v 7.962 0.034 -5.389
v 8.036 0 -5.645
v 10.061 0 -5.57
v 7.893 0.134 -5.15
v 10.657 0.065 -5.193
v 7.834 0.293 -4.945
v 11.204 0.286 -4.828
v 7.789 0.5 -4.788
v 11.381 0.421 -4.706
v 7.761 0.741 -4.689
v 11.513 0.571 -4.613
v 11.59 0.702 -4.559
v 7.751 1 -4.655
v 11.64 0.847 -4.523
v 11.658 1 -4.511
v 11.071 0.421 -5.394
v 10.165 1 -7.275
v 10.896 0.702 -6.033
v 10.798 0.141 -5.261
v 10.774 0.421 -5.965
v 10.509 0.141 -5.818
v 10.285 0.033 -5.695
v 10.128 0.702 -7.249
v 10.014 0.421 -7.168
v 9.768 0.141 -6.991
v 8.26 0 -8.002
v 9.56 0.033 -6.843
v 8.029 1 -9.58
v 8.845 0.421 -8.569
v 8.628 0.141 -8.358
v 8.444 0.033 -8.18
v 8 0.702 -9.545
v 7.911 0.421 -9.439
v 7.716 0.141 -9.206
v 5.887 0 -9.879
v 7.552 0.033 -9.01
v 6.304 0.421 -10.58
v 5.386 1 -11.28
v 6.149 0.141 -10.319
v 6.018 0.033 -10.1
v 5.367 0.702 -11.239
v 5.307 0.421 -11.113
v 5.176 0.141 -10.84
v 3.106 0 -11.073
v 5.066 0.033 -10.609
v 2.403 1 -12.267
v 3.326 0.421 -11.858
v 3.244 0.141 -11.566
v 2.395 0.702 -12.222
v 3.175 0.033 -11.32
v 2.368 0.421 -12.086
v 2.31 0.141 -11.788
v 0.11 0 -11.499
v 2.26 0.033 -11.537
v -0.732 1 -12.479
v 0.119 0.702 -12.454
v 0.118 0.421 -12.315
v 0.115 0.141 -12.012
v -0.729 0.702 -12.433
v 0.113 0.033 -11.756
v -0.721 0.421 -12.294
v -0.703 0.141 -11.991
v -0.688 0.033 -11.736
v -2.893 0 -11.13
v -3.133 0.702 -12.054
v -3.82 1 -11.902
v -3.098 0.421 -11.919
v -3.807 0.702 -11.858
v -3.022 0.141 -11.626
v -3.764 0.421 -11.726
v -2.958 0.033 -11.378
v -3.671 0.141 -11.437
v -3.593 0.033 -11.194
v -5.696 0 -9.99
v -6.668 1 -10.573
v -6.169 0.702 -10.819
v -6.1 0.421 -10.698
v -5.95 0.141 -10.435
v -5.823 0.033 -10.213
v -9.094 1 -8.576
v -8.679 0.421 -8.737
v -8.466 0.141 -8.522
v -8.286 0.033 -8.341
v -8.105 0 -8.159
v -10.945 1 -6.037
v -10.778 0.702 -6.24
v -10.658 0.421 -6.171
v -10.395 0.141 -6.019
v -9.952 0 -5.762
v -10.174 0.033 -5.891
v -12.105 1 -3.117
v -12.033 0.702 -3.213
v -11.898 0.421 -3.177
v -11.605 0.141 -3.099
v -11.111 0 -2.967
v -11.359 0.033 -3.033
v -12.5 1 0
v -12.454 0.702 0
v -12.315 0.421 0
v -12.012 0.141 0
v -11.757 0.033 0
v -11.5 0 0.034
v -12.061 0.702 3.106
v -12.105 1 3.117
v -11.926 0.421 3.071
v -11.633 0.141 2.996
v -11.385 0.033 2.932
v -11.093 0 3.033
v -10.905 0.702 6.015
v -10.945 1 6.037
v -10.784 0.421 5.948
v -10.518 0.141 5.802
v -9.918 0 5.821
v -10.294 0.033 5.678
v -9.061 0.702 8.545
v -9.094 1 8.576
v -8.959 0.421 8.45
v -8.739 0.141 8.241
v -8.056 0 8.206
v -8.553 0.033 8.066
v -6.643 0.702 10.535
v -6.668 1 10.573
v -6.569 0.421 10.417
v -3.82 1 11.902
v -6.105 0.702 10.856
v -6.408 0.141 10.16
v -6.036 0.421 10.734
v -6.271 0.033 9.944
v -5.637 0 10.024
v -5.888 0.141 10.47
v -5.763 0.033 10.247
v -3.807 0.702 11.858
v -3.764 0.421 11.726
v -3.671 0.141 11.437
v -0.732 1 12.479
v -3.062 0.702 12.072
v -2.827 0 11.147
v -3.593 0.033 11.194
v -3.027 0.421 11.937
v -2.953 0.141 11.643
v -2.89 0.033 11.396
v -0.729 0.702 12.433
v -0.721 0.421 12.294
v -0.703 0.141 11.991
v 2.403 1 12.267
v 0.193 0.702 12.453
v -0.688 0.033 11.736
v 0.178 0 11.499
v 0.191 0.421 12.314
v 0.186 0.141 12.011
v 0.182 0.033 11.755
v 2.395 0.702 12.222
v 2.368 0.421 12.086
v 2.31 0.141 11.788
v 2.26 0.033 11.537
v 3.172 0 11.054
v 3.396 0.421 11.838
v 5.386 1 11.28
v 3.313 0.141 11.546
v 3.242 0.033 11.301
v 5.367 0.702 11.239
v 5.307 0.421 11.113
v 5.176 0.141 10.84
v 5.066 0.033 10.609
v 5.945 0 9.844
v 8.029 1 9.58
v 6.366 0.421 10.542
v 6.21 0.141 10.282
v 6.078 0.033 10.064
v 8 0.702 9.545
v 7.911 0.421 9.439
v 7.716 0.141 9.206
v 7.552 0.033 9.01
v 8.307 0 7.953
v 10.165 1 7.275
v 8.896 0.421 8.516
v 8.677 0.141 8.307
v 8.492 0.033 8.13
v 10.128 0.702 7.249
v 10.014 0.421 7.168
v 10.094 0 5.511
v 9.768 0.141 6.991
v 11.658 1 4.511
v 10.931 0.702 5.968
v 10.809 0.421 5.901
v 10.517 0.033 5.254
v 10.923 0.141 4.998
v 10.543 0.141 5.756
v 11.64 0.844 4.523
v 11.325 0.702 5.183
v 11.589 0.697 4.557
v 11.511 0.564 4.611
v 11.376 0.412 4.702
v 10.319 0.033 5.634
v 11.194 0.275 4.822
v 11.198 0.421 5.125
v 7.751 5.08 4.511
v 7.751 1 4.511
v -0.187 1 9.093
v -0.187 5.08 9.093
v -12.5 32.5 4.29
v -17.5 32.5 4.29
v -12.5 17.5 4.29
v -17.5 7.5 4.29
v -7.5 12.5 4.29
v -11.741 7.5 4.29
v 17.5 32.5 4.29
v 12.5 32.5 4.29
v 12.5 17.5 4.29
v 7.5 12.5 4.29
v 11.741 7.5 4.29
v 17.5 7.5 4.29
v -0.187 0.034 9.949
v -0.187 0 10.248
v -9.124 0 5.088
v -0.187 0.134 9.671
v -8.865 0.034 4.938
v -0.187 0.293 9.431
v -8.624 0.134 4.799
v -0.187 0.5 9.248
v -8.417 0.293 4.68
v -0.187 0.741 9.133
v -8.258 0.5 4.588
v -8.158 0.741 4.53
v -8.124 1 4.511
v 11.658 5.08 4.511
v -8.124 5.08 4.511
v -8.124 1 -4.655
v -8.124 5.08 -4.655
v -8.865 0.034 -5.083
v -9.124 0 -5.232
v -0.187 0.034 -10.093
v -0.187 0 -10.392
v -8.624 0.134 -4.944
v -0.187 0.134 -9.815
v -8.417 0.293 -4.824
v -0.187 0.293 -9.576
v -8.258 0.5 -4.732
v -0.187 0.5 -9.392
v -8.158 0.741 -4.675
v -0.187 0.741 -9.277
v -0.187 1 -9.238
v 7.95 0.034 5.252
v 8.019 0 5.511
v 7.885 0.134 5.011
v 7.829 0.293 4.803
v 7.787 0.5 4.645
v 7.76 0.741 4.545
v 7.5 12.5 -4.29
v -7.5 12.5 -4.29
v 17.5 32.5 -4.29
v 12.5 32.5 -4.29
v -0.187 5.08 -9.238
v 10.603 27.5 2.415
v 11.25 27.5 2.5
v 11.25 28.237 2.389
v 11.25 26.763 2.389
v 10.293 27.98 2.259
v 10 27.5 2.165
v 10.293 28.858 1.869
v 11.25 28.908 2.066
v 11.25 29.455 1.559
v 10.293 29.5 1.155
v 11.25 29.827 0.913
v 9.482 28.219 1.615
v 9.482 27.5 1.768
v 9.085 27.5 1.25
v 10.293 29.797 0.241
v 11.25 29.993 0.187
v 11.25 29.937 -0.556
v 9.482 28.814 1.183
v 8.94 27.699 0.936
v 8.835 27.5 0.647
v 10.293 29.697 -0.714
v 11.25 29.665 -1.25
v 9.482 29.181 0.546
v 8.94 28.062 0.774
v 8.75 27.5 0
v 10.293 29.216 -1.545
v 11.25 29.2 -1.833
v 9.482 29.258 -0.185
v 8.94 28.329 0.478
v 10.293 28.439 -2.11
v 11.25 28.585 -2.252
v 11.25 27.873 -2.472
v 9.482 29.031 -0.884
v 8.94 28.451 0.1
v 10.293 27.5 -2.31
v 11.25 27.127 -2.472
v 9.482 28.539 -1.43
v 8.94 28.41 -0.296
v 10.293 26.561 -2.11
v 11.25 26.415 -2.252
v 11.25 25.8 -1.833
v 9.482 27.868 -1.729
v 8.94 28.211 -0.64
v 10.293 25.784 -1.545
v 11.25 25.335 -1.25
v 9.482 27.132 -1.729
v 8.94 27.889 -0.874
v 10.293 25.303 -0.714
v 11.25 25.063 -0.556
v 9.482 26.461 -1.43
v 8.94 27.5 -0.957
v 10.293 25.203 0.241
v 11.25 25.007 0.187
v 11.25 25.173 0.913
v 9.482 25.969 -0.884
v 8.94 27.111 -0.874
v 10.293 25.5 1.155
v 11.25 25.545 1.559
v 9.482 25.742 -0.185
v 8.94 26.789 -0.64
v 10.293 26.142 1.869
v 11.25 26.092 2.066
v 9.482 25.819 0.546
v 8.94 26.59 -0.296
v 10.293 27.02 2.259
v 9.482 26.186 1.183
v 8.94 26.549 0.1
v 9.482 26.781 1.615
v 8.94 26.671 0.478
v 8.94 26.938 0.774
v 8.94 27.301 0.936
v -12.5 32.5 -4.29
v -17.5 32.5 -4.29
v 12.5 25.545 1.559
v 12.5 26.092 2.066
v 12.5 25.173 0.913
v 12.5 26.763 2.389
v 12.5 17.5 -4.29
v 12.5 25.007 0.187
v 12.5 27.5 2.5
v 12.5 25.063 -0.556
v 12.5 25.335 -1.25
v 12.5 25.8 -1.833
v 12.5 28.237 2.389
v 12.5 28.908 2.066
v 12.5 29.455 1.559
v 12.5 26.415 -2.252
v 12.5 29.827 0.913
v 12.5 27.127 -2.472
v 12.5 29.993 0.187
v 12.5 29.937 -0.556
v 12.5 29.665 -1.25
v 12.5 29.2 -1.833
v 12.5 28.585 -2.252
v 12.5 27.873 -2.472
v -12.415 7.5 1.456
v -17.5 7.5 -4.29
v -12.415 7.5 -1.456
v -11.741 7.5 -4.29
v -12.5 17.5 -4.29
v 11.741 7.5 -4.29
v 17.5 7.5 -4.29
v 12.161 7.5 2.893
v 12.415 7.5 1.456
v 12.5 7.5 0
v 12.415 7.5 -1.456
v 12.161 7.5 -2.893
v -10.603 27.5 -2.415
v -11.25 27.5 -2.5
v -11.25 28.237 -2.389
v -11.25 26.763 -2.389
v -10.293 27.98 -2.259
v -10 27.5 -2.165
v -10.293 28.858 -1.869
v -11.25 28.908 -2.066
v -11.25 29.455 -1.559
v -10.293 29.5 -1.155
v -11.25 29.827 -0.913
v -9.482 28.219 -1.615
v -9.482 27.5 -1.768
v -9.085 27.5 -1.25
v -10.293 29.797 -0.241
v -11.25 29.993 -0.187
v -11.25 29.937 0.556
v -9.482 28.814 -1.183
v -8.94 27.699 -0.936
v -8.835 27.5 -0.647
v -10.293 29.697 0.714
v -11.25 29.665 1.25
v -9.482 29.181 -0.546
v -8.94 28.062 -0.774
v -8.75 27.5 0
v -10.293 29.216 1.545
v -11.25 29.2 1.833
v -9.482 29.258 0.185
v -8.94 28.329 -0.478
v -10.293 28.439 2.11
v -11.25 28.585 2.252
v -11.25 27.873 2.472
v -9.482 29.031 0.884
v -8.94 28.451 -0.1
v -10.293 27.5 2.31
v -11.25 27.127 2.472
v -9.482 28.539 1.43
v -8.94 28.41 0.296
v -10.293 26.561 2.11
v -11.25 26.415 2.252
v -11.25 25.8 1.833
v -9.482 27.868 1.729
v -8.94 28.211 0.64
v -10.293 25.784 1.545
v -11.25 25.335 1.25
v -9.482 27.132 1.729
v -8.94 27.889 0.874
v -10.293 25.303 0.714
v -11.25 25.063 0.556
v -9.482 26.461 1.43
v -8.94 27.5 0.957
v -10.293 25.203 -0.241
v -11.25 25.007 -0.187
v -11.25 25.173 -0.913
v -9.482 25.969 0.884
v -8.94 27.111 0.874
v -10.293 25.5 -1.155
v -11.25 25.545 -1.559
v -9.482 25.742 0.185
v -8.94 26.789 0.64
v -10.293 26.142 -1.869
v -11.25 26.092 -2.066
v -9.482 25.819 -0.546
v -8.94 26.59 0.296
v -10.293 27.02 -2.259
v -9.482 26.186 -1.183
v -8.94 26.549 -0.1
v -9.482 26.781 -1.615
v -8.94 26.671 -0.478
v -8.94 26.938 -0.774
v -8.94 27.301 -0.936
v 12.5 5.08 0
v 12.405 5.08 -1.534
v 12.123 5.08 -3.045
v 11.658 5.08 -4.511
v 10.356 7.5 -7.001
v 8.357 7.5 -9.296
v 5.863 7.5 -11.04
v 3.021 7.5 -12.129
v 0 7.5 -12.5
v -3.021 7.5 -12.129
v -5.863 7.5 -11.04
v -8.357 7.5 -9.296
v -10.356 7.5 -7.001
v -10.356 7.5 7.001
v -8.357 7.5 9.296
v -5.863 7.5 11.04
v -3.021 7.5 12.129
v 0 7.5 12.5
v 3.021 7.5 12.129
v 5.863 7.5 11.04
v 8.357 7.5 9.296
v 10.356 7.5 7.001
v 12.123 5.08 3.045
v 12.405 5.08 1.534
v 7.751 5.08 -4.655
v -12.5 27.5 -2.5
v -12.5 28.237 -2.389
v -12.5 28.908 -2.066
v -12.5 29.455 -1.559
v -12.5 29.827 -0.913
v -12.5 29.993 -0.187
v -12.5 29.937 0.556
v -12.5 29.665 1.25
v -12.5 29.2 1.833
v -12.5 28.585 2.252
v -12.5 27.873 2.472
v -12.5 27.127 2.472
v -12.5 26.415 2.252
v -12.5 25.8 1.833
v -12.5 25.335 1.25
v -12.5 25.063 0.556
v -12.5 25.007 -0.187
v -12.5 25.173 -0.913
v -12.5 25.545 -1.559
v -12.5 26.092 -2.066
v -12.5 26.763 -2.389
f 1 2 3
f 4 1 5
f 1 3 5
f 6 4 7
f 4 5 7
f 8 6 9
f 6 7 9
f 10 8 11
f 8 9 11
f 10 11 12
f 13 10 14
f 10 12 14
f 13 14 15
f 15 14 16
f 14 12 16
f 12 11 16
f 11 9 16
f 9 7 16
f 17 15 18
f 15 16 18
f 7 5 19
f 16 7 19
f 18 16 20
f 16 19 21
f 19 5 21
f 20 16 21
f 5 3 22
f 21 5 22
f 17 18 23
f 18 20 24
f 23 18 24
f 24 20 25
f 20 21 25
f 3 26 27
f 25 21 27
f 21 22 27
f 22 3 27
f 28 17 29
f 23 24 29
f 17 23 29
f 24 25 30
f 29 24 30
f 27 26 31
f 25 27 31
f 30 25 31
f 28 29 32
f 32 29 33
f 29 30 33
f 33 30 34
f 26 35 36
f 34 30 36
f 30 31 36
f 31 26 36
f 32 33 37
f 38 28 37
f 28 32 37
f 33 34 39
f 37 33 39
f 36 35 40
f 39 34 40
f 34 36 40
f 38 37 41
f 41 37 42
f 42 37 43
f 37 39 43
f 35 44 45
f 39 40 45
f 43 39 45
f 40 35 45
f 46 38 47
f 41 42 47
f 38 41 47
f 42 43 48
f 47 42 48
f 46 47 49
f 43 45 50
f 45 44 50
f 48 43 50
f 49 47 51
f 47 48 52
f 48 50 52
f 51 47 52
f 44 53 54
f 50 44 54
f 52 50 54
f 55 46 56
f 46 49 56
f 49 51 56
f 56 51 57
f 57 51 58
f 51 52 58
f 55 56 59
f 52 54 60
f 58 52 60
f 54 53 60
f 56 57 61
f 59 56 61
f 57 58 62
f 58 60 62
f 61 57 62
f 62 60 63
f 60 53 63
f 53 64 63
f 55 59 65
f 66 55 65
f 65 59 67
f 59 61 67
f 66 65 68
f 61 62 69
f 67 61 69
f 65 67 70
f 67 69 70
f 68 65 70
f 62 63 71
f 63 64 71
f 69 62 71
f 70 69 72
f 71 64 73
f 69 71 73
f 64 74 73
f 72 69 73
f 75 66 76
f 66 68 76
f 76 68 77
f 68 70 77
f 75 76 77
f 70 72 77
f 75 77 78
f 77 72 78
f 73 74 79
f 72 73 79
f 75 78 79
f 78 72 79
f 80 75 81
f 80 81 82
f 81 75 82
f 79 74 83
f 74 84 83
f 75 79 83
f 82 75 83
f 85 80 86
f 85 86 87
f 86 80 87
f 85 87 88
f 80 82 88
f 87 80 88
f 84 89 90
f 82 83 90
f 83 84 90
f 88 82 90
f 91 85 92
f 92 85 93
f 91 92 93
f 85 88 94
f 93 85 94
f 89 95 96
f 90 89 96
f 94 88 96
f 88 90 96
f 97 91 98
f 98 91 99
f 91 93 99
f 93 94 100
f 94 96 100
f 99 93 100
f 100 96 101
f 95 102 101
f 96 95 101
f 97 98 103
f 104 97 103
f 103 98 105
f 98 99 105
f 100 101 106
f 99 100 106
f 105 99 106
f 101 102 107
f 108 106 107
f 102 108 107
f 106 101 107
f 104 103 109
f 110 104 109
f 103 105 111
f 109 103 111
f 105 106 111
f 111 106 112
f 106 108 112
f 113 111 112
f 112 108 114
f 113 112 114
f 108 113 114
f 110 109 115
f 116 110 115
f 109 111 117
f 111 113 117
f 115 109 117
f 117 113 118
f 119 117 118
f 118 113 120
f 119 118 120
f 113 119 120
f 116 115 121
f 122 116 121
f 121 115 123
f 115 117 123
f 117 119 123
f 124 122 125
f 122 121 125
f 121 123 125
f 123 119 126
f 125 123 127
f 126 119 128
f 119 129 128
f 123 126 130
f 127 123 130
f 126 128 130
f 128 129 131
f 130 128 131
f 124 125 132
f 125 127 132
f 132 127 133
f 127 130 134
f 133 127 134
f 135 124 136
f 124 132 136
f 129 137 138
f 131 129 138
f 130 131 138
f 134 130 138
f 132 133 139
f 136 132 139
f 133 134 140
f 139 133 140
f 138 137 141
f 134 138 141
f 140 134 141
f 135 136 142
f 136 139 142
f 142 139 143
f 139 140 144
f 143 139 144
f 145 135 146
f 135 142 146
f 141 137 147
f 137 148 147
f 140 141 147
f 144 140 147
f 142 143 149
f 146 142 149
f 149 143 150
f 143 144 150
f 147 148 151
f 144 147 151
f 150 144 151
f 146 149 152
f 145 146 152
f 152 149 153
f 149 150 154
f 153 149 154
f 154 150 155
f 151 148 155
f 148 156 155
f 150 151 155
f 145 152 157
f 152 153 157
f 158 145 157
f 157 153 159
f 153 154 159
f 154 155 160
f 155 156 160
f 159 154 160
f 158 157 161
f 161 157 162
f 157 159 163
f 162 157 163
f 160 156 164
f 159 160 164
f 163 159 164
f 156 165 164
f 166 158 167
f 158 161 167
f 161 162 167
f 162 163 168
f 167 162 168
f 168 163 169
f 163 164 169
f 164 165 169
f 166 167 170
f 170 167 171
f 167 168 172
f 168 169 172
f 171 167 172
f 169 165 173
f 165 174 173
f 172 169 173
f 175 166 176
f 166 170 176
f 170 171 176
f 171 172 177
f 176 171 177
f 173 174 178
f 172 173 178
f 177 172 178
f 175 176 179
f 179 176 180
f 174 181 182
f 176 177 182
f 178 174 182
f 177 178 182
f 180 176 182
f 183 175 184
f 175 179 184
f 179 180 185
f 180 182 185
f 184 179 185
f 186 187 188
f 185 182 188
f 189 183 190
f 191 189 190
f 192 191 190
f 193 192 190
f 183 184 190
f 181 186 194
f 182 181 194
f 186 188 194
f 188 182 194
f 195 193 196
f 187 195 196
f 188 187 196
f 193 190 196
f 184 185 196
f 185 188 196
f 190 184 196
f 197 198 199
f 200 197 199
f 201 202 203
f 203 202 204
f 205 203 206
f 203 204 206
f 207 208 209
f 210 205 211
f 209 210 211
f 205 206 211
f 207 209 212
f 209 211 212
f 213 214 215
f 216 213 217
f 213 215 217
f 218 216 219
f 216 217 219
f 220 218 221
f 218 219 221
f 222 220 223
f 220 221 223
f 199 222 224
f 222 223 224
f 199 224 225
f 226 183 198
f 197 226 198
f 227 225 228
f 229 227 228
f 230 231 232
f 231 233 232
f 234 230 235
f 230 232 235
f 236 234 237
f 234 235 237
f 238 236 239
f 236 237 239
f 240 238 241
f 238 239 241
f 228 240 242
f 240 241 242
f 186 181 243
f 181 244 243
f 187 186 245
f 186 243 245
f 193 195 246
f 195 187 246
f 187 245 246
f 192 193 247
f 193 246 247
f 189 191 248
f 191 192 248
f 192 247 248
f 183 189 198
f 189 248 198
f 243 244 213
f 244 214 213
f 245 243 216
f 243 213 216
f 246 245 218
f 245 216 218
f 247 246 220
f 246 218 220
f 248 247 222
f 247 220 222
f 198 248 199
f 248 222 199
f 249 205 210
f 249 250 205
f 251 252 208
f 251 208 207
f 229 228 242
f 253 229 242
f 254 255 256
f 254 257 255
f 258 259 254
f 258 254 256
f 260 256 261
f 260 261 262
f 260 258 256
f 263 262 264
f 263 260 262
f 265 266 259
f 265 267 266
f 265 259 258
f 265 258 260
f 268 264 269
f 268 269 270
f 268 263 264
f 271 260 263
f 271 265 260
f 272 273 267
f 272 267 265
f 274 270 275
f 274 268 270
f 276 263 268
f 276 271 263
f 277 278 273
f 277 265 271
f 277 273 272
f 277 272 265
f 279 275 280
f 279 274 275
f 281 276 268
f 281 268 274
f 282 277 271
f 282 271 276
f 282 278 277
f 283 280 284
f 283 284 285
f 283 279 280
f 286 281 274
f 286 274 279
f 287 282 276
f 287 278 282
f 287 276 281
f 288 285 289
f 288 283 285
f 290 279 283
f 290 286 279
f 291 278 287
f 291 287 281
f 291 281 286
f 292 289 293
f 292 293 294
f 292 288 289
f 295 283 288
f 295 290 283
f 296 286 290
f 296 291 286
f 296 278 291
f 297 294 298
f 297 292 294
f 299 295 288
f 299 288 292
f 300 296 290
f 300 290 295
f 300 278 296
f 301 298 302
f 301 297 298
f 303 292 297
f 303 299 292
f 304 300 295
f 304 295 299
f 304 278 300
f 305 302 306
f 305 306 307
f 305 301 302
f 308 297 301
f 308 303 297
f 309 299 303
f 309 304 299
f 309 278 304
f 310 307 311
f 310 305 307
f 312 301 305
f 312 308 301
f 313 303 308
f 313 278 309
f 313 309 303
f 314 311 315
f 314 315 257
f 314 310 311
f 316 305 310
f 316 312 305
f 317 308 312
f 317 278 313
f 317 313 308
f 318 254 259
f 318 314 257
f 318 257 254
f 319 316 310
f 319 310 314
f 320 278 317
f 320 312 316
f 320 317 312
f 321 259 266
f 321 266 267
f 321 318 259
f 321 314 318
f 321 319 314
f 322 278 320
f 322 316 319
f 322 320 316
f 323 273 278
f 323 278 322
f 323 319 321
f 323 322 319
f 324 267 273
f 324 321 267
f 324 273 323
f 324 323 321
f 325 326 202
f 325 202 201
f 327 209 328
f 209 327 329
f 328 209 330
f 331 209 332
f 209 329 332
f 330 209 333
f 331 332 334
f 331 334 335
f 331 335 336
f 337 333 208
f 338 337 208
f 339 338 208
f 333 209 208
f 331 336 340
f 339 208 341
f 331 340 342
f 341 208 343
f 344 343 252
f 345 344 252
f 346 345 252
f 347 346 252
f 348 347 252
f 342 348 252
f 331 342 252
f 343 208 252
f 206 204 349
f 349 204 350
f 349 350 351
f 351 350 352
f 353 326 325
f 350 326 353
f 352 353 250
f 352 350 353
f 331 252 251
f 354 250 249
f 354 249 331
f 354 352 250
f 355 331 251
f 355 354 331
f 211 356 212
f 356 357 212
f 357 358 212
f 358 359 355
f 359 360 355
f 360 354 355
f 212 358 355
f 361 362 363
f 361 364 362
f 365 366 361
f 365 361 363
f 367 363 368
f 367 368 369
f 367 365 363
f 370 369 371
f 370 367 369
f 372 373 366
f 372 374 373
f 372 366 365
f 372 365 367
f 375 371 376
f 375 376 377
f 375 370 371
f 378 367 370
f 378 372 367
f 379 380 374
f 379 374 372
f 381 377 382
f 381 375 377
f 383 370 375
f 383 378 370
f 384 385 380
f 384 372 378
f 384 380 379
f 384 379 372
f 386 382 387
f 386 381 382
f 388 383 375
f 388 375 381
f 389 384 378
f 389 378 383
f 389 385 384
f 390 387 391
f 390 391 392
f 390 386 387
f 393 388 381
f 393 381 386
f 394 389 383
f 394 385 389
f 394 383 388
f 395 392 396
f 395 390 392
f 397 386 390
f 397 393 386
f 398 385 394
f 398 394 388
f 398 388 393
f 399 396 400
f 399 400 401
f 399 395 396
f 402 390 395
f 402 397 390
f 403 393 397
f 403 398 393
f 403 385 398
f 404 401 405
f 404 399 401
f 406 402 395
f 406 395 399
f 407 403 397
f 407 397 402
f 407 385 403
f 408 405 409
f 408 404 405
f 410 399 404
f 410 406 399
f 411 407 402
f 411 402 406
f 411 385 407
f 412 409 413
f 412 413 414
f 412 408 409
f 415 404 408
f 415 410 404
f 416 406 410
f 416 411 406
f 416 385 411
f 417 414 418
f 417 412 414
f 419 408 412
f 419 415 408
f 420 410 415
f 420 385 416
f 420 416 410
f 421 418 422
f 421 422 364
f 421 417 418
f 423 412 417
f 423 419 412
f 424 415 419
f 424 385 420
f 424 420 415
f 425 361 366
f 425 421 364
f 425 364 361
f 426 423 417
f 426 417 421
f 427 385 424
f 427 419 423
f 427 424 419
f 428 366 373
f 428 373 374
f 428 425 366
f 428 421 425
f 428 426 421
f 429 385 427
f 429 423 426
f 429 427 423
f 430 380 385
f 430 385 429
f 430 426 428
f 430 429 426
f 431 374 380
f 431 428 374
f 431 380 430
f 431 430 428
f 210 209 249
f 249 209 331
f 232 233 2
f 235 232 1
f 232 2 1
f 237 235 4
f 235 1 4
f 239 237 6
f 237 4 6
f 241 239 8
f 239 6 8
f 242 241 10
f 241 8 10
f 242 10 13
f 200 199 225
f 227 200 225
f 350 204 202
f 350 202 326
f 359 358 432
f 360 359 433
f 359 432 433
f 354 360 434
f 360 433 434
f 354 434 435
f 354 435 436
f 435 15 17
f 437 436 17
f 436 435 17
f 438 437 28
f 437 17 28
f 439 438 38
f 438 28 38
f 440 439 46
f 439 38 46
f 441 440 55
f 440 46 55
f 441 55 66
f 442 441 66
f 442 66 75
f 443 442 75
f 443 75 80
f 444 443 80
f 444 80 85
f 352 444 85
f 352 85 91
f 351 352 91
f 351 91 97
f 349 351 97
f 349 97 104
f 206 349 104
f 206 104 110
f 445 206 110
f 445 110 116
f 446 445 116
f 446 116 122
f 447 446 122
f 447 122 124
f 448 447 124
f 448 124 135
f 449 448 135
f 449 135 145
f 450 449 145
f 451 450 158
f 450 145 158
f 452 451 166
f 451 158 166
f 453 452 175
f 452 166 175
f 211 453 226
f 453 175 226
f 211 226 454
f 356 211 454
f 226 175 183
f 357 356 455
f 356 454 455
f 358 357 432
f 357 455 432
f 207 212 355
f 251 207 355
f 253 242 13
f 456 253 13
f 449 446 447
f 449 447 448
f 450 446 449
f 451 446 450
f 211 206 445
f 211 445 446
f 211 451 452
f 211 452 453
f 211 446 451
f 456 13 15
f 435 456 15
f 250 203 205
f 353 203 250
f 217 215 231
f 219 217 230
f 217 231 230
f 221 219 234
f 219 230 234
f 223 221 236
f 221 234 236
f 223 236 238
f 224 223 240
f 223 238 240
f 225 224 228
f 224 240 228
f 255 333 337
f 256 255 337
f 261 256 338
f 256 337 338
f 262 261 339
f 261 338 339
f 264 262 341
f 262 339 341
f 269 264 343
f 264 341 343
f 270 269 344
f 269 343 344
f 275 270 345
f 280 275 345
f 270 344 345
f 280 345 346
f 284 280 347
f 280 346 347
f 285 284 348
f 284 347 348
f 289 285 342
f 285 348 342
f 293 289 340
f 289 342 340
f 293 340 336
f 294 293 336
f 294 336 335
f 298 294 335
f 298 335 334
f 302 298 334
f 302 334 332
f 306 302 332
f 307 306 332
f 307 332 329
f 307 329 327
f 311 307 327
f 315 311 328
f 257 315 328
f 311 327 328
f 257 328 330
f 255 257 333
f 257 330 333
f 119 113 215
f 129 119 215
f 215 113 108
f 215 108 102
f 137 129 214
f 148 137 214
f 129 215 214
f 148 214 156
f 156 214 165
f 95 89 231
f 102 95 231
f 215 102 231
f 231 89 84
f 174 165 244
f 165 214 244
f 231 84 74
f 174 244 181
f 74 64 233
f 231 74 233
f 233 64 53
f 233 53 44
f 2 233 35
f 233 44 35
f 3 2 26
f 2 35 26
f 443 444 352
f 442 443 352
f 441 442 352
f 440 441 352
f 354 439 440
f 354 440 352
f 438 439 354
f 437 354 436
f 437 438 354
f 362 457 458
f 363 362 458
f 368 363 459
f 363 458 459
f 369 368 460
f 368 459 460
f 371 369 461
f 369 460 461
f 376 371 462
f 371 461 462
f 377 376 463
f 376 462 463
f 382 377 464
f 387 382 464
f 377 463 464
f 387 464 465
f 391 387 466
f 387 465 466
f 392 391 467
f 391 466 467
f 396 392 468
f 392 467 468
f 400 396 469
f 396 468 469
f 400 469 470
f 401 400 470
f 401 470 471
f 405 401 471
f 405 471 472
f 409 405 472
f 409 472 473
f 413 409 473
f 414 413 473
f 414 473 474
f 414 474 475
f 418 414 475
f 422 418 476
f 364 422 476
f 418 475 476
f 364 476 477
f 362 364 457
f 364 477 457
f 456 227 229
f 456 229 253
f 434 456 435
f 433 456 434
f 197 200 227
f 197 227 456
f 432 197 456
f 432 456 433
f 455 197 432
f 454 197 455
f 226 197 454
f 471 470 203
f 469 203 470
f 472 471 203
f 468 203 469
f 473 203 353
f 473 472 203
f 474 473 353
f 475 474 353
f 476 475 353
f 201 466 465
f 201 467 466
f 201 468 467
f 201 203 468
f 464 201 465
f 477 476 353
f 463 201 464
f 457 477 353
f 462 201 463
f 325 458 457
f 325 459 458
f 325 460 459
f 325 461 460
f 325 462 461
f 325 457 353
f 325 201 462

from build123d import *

# Parameters (mm, degrees)
SKETCH1_R           = 12.5
BOSS_EXTRUDE1_DEPTH = 7.5
SKETCH2_W           = 35
SKETCH2_H           = 8.580767914
BOSS_EXTRUDE2_DEPTH = 25
SKETCH3_W           = 25
SKETCH3_H           = 8.580767914
CUT_EXTRUDE1_DEPTH  = 20
SKETCH4_R           = 2.5
BOSS_EXTRUDE3_DEPTH = 3.75
SKETCH5_R           = 2.5
BOSS_EXTRUDE4_DEPTH = 3.75
FILLET2_R           = 2.5
FILLET3_R           = 2.5
CHAMFER1_SIZE       = 5
CHAMFER2_SIZE       = 5
CUT_EXTRUDE2_DEPTH  = 5.08
FILLET4_R           = 1


with BuildPart() as part:
    # Sketch1 → Boss-Extrude1 (new body)
    with BuildSketch(Plane(origin=(0, 0, 0), x_dir=(1, 0, 0), z_dir=(0, 1, 0))):
        Circle(SKETCH1_R)
    extrude(amount=BOSS_EXTRUDE1_DEPTH)

    # Sketch2 → Boss-Extrude2 (add)
    with BuildSketch(Plane(origin=(0, 7.5, 0), x_dir=(1, 0, 0), z_dir=(0, 1, 0))):
        Rectangle(SKETCH2_W, SKETCH2_H)
    extrude(amount=BOSS_EXTRUDE2_DEPTH)

    # Sketch3 → Cut-Extrude1 (cut)
    with BuildSketch(Plane(origin=(0, 32.5, 0), x_dir=(1, 0, 0), z_dir=(0, 1, 0))):
        Rectangle(SKETCH3_W, SKETCH3_H)
    extrude(amount=-CUT_EXTRUDE1_DEPTH, mode=Mode.SUBTRACT)

    # Sketch4 → Boss-Extrude3 (add)
    with BuildSketch(Plane(origin=(-12.5, 0, 0), x_dir=(0, 0, -1), z_dir=(1, 0, 0))):
        with Locations((0, 27.5)):
            Circle(SKETCH4_R)
    extrude(amount=BOSS_EXTRUDE3_DEPTH)

    # Sketch5 → Boss-Extrude4 (add)
    with BuildSketch(Plane.ZY.offset(-12.5)):
        with Locations((0, 27.5)):
            Circle(SKETCH5_R)
    extrude(amount=BOSS_EXTRUDE4_DEPTH)

    # Fillet2
    fillet2_edges = [part.edges().sort_by_distance(p)[0] for p in [
        (-8.75, 27.5, 2.5),
    ]]
    fillet(fillet2_edges, radius=FILLET2_R)

    # Fillet3
    fillet3_edges = [part.edges().sort_by_distance(p)[0] for p in [
        (8.75, 27.5, -2.5),
    ]]
    fillet(fillet3_edges, radius=FILLET3_R)

    # Chamfer1
    chamfer1_edges = [part.edges().sort_by_distance(p)[0] for p in [
        (-12.5, 12.5, 0),
    ]]
    chamfer(chamfer1_edges, length=CHAMFER1_SIZE)

    # Chamfer2
    chamfer2_edges = [part.edges().sort_by_distance(p)[0] for p in [
        (12.5, 12.5, 0),
    ]]
    chamfer(chamfer2_edges, length=CHAMFER2_SIZE)

    # Sketch6 → Cut-Extrude2 (cut)
    with BuildSketch(Plane.XZ):
        with BuildLine():
            Line((7.750974756, -4.654886545), (11.657827753, -4.510548978))
            ThreePointArc((11.657827753, -4.510548978), (12.287653293, -2.294248579), (12.5, 0))
            ThreePointArc((12.5, 0), (12.287653293, 2.294248579), (11.657827753, 4.510548978))
            Line((11.657827753, 4.510548978), (7.750974756, 4.510548978))
            Line((7.750974756, 4.510548978), (-0.186525244, 9.09326674))
            Line((-0.186525244, 9.09326674), (-8.124025244, 4.510548978))
            Line((-8.124025244, 4.510548978), (-8.124025244, -4.654886545))
            Line((-8.124025244, -4.654886545), (-0.186525244, -9.237604307))
            Line((-0.186525244, -9.237604307), (7.750974756, -4.654886545))
        make_face()
    extrude(amount=-CUT_EXTRUDE2_DEPTH, mode=Mode.SUBTRACT)

    # Fillet4
    fillet4_edges = [part.edges().sort_by_distance(p)[0] for p in [
        (-12.5, 0, 0),
        (9.704401254, 0, 4.510548978),
        (9.704401254, 0, -4.582717762),
        (3.782224756, 0, -6.946245426),
        (-4.155275244, 0, -6.946245426),
        (-8.124025244, 0, -0.072168784),
        (-4.155275244, 0, 6.801907859),
        (3.782224756, 0, 6.801907859),
    ]]
    fillet(fillet4_edges, radius=FILLET4_R)


solid = part.part
